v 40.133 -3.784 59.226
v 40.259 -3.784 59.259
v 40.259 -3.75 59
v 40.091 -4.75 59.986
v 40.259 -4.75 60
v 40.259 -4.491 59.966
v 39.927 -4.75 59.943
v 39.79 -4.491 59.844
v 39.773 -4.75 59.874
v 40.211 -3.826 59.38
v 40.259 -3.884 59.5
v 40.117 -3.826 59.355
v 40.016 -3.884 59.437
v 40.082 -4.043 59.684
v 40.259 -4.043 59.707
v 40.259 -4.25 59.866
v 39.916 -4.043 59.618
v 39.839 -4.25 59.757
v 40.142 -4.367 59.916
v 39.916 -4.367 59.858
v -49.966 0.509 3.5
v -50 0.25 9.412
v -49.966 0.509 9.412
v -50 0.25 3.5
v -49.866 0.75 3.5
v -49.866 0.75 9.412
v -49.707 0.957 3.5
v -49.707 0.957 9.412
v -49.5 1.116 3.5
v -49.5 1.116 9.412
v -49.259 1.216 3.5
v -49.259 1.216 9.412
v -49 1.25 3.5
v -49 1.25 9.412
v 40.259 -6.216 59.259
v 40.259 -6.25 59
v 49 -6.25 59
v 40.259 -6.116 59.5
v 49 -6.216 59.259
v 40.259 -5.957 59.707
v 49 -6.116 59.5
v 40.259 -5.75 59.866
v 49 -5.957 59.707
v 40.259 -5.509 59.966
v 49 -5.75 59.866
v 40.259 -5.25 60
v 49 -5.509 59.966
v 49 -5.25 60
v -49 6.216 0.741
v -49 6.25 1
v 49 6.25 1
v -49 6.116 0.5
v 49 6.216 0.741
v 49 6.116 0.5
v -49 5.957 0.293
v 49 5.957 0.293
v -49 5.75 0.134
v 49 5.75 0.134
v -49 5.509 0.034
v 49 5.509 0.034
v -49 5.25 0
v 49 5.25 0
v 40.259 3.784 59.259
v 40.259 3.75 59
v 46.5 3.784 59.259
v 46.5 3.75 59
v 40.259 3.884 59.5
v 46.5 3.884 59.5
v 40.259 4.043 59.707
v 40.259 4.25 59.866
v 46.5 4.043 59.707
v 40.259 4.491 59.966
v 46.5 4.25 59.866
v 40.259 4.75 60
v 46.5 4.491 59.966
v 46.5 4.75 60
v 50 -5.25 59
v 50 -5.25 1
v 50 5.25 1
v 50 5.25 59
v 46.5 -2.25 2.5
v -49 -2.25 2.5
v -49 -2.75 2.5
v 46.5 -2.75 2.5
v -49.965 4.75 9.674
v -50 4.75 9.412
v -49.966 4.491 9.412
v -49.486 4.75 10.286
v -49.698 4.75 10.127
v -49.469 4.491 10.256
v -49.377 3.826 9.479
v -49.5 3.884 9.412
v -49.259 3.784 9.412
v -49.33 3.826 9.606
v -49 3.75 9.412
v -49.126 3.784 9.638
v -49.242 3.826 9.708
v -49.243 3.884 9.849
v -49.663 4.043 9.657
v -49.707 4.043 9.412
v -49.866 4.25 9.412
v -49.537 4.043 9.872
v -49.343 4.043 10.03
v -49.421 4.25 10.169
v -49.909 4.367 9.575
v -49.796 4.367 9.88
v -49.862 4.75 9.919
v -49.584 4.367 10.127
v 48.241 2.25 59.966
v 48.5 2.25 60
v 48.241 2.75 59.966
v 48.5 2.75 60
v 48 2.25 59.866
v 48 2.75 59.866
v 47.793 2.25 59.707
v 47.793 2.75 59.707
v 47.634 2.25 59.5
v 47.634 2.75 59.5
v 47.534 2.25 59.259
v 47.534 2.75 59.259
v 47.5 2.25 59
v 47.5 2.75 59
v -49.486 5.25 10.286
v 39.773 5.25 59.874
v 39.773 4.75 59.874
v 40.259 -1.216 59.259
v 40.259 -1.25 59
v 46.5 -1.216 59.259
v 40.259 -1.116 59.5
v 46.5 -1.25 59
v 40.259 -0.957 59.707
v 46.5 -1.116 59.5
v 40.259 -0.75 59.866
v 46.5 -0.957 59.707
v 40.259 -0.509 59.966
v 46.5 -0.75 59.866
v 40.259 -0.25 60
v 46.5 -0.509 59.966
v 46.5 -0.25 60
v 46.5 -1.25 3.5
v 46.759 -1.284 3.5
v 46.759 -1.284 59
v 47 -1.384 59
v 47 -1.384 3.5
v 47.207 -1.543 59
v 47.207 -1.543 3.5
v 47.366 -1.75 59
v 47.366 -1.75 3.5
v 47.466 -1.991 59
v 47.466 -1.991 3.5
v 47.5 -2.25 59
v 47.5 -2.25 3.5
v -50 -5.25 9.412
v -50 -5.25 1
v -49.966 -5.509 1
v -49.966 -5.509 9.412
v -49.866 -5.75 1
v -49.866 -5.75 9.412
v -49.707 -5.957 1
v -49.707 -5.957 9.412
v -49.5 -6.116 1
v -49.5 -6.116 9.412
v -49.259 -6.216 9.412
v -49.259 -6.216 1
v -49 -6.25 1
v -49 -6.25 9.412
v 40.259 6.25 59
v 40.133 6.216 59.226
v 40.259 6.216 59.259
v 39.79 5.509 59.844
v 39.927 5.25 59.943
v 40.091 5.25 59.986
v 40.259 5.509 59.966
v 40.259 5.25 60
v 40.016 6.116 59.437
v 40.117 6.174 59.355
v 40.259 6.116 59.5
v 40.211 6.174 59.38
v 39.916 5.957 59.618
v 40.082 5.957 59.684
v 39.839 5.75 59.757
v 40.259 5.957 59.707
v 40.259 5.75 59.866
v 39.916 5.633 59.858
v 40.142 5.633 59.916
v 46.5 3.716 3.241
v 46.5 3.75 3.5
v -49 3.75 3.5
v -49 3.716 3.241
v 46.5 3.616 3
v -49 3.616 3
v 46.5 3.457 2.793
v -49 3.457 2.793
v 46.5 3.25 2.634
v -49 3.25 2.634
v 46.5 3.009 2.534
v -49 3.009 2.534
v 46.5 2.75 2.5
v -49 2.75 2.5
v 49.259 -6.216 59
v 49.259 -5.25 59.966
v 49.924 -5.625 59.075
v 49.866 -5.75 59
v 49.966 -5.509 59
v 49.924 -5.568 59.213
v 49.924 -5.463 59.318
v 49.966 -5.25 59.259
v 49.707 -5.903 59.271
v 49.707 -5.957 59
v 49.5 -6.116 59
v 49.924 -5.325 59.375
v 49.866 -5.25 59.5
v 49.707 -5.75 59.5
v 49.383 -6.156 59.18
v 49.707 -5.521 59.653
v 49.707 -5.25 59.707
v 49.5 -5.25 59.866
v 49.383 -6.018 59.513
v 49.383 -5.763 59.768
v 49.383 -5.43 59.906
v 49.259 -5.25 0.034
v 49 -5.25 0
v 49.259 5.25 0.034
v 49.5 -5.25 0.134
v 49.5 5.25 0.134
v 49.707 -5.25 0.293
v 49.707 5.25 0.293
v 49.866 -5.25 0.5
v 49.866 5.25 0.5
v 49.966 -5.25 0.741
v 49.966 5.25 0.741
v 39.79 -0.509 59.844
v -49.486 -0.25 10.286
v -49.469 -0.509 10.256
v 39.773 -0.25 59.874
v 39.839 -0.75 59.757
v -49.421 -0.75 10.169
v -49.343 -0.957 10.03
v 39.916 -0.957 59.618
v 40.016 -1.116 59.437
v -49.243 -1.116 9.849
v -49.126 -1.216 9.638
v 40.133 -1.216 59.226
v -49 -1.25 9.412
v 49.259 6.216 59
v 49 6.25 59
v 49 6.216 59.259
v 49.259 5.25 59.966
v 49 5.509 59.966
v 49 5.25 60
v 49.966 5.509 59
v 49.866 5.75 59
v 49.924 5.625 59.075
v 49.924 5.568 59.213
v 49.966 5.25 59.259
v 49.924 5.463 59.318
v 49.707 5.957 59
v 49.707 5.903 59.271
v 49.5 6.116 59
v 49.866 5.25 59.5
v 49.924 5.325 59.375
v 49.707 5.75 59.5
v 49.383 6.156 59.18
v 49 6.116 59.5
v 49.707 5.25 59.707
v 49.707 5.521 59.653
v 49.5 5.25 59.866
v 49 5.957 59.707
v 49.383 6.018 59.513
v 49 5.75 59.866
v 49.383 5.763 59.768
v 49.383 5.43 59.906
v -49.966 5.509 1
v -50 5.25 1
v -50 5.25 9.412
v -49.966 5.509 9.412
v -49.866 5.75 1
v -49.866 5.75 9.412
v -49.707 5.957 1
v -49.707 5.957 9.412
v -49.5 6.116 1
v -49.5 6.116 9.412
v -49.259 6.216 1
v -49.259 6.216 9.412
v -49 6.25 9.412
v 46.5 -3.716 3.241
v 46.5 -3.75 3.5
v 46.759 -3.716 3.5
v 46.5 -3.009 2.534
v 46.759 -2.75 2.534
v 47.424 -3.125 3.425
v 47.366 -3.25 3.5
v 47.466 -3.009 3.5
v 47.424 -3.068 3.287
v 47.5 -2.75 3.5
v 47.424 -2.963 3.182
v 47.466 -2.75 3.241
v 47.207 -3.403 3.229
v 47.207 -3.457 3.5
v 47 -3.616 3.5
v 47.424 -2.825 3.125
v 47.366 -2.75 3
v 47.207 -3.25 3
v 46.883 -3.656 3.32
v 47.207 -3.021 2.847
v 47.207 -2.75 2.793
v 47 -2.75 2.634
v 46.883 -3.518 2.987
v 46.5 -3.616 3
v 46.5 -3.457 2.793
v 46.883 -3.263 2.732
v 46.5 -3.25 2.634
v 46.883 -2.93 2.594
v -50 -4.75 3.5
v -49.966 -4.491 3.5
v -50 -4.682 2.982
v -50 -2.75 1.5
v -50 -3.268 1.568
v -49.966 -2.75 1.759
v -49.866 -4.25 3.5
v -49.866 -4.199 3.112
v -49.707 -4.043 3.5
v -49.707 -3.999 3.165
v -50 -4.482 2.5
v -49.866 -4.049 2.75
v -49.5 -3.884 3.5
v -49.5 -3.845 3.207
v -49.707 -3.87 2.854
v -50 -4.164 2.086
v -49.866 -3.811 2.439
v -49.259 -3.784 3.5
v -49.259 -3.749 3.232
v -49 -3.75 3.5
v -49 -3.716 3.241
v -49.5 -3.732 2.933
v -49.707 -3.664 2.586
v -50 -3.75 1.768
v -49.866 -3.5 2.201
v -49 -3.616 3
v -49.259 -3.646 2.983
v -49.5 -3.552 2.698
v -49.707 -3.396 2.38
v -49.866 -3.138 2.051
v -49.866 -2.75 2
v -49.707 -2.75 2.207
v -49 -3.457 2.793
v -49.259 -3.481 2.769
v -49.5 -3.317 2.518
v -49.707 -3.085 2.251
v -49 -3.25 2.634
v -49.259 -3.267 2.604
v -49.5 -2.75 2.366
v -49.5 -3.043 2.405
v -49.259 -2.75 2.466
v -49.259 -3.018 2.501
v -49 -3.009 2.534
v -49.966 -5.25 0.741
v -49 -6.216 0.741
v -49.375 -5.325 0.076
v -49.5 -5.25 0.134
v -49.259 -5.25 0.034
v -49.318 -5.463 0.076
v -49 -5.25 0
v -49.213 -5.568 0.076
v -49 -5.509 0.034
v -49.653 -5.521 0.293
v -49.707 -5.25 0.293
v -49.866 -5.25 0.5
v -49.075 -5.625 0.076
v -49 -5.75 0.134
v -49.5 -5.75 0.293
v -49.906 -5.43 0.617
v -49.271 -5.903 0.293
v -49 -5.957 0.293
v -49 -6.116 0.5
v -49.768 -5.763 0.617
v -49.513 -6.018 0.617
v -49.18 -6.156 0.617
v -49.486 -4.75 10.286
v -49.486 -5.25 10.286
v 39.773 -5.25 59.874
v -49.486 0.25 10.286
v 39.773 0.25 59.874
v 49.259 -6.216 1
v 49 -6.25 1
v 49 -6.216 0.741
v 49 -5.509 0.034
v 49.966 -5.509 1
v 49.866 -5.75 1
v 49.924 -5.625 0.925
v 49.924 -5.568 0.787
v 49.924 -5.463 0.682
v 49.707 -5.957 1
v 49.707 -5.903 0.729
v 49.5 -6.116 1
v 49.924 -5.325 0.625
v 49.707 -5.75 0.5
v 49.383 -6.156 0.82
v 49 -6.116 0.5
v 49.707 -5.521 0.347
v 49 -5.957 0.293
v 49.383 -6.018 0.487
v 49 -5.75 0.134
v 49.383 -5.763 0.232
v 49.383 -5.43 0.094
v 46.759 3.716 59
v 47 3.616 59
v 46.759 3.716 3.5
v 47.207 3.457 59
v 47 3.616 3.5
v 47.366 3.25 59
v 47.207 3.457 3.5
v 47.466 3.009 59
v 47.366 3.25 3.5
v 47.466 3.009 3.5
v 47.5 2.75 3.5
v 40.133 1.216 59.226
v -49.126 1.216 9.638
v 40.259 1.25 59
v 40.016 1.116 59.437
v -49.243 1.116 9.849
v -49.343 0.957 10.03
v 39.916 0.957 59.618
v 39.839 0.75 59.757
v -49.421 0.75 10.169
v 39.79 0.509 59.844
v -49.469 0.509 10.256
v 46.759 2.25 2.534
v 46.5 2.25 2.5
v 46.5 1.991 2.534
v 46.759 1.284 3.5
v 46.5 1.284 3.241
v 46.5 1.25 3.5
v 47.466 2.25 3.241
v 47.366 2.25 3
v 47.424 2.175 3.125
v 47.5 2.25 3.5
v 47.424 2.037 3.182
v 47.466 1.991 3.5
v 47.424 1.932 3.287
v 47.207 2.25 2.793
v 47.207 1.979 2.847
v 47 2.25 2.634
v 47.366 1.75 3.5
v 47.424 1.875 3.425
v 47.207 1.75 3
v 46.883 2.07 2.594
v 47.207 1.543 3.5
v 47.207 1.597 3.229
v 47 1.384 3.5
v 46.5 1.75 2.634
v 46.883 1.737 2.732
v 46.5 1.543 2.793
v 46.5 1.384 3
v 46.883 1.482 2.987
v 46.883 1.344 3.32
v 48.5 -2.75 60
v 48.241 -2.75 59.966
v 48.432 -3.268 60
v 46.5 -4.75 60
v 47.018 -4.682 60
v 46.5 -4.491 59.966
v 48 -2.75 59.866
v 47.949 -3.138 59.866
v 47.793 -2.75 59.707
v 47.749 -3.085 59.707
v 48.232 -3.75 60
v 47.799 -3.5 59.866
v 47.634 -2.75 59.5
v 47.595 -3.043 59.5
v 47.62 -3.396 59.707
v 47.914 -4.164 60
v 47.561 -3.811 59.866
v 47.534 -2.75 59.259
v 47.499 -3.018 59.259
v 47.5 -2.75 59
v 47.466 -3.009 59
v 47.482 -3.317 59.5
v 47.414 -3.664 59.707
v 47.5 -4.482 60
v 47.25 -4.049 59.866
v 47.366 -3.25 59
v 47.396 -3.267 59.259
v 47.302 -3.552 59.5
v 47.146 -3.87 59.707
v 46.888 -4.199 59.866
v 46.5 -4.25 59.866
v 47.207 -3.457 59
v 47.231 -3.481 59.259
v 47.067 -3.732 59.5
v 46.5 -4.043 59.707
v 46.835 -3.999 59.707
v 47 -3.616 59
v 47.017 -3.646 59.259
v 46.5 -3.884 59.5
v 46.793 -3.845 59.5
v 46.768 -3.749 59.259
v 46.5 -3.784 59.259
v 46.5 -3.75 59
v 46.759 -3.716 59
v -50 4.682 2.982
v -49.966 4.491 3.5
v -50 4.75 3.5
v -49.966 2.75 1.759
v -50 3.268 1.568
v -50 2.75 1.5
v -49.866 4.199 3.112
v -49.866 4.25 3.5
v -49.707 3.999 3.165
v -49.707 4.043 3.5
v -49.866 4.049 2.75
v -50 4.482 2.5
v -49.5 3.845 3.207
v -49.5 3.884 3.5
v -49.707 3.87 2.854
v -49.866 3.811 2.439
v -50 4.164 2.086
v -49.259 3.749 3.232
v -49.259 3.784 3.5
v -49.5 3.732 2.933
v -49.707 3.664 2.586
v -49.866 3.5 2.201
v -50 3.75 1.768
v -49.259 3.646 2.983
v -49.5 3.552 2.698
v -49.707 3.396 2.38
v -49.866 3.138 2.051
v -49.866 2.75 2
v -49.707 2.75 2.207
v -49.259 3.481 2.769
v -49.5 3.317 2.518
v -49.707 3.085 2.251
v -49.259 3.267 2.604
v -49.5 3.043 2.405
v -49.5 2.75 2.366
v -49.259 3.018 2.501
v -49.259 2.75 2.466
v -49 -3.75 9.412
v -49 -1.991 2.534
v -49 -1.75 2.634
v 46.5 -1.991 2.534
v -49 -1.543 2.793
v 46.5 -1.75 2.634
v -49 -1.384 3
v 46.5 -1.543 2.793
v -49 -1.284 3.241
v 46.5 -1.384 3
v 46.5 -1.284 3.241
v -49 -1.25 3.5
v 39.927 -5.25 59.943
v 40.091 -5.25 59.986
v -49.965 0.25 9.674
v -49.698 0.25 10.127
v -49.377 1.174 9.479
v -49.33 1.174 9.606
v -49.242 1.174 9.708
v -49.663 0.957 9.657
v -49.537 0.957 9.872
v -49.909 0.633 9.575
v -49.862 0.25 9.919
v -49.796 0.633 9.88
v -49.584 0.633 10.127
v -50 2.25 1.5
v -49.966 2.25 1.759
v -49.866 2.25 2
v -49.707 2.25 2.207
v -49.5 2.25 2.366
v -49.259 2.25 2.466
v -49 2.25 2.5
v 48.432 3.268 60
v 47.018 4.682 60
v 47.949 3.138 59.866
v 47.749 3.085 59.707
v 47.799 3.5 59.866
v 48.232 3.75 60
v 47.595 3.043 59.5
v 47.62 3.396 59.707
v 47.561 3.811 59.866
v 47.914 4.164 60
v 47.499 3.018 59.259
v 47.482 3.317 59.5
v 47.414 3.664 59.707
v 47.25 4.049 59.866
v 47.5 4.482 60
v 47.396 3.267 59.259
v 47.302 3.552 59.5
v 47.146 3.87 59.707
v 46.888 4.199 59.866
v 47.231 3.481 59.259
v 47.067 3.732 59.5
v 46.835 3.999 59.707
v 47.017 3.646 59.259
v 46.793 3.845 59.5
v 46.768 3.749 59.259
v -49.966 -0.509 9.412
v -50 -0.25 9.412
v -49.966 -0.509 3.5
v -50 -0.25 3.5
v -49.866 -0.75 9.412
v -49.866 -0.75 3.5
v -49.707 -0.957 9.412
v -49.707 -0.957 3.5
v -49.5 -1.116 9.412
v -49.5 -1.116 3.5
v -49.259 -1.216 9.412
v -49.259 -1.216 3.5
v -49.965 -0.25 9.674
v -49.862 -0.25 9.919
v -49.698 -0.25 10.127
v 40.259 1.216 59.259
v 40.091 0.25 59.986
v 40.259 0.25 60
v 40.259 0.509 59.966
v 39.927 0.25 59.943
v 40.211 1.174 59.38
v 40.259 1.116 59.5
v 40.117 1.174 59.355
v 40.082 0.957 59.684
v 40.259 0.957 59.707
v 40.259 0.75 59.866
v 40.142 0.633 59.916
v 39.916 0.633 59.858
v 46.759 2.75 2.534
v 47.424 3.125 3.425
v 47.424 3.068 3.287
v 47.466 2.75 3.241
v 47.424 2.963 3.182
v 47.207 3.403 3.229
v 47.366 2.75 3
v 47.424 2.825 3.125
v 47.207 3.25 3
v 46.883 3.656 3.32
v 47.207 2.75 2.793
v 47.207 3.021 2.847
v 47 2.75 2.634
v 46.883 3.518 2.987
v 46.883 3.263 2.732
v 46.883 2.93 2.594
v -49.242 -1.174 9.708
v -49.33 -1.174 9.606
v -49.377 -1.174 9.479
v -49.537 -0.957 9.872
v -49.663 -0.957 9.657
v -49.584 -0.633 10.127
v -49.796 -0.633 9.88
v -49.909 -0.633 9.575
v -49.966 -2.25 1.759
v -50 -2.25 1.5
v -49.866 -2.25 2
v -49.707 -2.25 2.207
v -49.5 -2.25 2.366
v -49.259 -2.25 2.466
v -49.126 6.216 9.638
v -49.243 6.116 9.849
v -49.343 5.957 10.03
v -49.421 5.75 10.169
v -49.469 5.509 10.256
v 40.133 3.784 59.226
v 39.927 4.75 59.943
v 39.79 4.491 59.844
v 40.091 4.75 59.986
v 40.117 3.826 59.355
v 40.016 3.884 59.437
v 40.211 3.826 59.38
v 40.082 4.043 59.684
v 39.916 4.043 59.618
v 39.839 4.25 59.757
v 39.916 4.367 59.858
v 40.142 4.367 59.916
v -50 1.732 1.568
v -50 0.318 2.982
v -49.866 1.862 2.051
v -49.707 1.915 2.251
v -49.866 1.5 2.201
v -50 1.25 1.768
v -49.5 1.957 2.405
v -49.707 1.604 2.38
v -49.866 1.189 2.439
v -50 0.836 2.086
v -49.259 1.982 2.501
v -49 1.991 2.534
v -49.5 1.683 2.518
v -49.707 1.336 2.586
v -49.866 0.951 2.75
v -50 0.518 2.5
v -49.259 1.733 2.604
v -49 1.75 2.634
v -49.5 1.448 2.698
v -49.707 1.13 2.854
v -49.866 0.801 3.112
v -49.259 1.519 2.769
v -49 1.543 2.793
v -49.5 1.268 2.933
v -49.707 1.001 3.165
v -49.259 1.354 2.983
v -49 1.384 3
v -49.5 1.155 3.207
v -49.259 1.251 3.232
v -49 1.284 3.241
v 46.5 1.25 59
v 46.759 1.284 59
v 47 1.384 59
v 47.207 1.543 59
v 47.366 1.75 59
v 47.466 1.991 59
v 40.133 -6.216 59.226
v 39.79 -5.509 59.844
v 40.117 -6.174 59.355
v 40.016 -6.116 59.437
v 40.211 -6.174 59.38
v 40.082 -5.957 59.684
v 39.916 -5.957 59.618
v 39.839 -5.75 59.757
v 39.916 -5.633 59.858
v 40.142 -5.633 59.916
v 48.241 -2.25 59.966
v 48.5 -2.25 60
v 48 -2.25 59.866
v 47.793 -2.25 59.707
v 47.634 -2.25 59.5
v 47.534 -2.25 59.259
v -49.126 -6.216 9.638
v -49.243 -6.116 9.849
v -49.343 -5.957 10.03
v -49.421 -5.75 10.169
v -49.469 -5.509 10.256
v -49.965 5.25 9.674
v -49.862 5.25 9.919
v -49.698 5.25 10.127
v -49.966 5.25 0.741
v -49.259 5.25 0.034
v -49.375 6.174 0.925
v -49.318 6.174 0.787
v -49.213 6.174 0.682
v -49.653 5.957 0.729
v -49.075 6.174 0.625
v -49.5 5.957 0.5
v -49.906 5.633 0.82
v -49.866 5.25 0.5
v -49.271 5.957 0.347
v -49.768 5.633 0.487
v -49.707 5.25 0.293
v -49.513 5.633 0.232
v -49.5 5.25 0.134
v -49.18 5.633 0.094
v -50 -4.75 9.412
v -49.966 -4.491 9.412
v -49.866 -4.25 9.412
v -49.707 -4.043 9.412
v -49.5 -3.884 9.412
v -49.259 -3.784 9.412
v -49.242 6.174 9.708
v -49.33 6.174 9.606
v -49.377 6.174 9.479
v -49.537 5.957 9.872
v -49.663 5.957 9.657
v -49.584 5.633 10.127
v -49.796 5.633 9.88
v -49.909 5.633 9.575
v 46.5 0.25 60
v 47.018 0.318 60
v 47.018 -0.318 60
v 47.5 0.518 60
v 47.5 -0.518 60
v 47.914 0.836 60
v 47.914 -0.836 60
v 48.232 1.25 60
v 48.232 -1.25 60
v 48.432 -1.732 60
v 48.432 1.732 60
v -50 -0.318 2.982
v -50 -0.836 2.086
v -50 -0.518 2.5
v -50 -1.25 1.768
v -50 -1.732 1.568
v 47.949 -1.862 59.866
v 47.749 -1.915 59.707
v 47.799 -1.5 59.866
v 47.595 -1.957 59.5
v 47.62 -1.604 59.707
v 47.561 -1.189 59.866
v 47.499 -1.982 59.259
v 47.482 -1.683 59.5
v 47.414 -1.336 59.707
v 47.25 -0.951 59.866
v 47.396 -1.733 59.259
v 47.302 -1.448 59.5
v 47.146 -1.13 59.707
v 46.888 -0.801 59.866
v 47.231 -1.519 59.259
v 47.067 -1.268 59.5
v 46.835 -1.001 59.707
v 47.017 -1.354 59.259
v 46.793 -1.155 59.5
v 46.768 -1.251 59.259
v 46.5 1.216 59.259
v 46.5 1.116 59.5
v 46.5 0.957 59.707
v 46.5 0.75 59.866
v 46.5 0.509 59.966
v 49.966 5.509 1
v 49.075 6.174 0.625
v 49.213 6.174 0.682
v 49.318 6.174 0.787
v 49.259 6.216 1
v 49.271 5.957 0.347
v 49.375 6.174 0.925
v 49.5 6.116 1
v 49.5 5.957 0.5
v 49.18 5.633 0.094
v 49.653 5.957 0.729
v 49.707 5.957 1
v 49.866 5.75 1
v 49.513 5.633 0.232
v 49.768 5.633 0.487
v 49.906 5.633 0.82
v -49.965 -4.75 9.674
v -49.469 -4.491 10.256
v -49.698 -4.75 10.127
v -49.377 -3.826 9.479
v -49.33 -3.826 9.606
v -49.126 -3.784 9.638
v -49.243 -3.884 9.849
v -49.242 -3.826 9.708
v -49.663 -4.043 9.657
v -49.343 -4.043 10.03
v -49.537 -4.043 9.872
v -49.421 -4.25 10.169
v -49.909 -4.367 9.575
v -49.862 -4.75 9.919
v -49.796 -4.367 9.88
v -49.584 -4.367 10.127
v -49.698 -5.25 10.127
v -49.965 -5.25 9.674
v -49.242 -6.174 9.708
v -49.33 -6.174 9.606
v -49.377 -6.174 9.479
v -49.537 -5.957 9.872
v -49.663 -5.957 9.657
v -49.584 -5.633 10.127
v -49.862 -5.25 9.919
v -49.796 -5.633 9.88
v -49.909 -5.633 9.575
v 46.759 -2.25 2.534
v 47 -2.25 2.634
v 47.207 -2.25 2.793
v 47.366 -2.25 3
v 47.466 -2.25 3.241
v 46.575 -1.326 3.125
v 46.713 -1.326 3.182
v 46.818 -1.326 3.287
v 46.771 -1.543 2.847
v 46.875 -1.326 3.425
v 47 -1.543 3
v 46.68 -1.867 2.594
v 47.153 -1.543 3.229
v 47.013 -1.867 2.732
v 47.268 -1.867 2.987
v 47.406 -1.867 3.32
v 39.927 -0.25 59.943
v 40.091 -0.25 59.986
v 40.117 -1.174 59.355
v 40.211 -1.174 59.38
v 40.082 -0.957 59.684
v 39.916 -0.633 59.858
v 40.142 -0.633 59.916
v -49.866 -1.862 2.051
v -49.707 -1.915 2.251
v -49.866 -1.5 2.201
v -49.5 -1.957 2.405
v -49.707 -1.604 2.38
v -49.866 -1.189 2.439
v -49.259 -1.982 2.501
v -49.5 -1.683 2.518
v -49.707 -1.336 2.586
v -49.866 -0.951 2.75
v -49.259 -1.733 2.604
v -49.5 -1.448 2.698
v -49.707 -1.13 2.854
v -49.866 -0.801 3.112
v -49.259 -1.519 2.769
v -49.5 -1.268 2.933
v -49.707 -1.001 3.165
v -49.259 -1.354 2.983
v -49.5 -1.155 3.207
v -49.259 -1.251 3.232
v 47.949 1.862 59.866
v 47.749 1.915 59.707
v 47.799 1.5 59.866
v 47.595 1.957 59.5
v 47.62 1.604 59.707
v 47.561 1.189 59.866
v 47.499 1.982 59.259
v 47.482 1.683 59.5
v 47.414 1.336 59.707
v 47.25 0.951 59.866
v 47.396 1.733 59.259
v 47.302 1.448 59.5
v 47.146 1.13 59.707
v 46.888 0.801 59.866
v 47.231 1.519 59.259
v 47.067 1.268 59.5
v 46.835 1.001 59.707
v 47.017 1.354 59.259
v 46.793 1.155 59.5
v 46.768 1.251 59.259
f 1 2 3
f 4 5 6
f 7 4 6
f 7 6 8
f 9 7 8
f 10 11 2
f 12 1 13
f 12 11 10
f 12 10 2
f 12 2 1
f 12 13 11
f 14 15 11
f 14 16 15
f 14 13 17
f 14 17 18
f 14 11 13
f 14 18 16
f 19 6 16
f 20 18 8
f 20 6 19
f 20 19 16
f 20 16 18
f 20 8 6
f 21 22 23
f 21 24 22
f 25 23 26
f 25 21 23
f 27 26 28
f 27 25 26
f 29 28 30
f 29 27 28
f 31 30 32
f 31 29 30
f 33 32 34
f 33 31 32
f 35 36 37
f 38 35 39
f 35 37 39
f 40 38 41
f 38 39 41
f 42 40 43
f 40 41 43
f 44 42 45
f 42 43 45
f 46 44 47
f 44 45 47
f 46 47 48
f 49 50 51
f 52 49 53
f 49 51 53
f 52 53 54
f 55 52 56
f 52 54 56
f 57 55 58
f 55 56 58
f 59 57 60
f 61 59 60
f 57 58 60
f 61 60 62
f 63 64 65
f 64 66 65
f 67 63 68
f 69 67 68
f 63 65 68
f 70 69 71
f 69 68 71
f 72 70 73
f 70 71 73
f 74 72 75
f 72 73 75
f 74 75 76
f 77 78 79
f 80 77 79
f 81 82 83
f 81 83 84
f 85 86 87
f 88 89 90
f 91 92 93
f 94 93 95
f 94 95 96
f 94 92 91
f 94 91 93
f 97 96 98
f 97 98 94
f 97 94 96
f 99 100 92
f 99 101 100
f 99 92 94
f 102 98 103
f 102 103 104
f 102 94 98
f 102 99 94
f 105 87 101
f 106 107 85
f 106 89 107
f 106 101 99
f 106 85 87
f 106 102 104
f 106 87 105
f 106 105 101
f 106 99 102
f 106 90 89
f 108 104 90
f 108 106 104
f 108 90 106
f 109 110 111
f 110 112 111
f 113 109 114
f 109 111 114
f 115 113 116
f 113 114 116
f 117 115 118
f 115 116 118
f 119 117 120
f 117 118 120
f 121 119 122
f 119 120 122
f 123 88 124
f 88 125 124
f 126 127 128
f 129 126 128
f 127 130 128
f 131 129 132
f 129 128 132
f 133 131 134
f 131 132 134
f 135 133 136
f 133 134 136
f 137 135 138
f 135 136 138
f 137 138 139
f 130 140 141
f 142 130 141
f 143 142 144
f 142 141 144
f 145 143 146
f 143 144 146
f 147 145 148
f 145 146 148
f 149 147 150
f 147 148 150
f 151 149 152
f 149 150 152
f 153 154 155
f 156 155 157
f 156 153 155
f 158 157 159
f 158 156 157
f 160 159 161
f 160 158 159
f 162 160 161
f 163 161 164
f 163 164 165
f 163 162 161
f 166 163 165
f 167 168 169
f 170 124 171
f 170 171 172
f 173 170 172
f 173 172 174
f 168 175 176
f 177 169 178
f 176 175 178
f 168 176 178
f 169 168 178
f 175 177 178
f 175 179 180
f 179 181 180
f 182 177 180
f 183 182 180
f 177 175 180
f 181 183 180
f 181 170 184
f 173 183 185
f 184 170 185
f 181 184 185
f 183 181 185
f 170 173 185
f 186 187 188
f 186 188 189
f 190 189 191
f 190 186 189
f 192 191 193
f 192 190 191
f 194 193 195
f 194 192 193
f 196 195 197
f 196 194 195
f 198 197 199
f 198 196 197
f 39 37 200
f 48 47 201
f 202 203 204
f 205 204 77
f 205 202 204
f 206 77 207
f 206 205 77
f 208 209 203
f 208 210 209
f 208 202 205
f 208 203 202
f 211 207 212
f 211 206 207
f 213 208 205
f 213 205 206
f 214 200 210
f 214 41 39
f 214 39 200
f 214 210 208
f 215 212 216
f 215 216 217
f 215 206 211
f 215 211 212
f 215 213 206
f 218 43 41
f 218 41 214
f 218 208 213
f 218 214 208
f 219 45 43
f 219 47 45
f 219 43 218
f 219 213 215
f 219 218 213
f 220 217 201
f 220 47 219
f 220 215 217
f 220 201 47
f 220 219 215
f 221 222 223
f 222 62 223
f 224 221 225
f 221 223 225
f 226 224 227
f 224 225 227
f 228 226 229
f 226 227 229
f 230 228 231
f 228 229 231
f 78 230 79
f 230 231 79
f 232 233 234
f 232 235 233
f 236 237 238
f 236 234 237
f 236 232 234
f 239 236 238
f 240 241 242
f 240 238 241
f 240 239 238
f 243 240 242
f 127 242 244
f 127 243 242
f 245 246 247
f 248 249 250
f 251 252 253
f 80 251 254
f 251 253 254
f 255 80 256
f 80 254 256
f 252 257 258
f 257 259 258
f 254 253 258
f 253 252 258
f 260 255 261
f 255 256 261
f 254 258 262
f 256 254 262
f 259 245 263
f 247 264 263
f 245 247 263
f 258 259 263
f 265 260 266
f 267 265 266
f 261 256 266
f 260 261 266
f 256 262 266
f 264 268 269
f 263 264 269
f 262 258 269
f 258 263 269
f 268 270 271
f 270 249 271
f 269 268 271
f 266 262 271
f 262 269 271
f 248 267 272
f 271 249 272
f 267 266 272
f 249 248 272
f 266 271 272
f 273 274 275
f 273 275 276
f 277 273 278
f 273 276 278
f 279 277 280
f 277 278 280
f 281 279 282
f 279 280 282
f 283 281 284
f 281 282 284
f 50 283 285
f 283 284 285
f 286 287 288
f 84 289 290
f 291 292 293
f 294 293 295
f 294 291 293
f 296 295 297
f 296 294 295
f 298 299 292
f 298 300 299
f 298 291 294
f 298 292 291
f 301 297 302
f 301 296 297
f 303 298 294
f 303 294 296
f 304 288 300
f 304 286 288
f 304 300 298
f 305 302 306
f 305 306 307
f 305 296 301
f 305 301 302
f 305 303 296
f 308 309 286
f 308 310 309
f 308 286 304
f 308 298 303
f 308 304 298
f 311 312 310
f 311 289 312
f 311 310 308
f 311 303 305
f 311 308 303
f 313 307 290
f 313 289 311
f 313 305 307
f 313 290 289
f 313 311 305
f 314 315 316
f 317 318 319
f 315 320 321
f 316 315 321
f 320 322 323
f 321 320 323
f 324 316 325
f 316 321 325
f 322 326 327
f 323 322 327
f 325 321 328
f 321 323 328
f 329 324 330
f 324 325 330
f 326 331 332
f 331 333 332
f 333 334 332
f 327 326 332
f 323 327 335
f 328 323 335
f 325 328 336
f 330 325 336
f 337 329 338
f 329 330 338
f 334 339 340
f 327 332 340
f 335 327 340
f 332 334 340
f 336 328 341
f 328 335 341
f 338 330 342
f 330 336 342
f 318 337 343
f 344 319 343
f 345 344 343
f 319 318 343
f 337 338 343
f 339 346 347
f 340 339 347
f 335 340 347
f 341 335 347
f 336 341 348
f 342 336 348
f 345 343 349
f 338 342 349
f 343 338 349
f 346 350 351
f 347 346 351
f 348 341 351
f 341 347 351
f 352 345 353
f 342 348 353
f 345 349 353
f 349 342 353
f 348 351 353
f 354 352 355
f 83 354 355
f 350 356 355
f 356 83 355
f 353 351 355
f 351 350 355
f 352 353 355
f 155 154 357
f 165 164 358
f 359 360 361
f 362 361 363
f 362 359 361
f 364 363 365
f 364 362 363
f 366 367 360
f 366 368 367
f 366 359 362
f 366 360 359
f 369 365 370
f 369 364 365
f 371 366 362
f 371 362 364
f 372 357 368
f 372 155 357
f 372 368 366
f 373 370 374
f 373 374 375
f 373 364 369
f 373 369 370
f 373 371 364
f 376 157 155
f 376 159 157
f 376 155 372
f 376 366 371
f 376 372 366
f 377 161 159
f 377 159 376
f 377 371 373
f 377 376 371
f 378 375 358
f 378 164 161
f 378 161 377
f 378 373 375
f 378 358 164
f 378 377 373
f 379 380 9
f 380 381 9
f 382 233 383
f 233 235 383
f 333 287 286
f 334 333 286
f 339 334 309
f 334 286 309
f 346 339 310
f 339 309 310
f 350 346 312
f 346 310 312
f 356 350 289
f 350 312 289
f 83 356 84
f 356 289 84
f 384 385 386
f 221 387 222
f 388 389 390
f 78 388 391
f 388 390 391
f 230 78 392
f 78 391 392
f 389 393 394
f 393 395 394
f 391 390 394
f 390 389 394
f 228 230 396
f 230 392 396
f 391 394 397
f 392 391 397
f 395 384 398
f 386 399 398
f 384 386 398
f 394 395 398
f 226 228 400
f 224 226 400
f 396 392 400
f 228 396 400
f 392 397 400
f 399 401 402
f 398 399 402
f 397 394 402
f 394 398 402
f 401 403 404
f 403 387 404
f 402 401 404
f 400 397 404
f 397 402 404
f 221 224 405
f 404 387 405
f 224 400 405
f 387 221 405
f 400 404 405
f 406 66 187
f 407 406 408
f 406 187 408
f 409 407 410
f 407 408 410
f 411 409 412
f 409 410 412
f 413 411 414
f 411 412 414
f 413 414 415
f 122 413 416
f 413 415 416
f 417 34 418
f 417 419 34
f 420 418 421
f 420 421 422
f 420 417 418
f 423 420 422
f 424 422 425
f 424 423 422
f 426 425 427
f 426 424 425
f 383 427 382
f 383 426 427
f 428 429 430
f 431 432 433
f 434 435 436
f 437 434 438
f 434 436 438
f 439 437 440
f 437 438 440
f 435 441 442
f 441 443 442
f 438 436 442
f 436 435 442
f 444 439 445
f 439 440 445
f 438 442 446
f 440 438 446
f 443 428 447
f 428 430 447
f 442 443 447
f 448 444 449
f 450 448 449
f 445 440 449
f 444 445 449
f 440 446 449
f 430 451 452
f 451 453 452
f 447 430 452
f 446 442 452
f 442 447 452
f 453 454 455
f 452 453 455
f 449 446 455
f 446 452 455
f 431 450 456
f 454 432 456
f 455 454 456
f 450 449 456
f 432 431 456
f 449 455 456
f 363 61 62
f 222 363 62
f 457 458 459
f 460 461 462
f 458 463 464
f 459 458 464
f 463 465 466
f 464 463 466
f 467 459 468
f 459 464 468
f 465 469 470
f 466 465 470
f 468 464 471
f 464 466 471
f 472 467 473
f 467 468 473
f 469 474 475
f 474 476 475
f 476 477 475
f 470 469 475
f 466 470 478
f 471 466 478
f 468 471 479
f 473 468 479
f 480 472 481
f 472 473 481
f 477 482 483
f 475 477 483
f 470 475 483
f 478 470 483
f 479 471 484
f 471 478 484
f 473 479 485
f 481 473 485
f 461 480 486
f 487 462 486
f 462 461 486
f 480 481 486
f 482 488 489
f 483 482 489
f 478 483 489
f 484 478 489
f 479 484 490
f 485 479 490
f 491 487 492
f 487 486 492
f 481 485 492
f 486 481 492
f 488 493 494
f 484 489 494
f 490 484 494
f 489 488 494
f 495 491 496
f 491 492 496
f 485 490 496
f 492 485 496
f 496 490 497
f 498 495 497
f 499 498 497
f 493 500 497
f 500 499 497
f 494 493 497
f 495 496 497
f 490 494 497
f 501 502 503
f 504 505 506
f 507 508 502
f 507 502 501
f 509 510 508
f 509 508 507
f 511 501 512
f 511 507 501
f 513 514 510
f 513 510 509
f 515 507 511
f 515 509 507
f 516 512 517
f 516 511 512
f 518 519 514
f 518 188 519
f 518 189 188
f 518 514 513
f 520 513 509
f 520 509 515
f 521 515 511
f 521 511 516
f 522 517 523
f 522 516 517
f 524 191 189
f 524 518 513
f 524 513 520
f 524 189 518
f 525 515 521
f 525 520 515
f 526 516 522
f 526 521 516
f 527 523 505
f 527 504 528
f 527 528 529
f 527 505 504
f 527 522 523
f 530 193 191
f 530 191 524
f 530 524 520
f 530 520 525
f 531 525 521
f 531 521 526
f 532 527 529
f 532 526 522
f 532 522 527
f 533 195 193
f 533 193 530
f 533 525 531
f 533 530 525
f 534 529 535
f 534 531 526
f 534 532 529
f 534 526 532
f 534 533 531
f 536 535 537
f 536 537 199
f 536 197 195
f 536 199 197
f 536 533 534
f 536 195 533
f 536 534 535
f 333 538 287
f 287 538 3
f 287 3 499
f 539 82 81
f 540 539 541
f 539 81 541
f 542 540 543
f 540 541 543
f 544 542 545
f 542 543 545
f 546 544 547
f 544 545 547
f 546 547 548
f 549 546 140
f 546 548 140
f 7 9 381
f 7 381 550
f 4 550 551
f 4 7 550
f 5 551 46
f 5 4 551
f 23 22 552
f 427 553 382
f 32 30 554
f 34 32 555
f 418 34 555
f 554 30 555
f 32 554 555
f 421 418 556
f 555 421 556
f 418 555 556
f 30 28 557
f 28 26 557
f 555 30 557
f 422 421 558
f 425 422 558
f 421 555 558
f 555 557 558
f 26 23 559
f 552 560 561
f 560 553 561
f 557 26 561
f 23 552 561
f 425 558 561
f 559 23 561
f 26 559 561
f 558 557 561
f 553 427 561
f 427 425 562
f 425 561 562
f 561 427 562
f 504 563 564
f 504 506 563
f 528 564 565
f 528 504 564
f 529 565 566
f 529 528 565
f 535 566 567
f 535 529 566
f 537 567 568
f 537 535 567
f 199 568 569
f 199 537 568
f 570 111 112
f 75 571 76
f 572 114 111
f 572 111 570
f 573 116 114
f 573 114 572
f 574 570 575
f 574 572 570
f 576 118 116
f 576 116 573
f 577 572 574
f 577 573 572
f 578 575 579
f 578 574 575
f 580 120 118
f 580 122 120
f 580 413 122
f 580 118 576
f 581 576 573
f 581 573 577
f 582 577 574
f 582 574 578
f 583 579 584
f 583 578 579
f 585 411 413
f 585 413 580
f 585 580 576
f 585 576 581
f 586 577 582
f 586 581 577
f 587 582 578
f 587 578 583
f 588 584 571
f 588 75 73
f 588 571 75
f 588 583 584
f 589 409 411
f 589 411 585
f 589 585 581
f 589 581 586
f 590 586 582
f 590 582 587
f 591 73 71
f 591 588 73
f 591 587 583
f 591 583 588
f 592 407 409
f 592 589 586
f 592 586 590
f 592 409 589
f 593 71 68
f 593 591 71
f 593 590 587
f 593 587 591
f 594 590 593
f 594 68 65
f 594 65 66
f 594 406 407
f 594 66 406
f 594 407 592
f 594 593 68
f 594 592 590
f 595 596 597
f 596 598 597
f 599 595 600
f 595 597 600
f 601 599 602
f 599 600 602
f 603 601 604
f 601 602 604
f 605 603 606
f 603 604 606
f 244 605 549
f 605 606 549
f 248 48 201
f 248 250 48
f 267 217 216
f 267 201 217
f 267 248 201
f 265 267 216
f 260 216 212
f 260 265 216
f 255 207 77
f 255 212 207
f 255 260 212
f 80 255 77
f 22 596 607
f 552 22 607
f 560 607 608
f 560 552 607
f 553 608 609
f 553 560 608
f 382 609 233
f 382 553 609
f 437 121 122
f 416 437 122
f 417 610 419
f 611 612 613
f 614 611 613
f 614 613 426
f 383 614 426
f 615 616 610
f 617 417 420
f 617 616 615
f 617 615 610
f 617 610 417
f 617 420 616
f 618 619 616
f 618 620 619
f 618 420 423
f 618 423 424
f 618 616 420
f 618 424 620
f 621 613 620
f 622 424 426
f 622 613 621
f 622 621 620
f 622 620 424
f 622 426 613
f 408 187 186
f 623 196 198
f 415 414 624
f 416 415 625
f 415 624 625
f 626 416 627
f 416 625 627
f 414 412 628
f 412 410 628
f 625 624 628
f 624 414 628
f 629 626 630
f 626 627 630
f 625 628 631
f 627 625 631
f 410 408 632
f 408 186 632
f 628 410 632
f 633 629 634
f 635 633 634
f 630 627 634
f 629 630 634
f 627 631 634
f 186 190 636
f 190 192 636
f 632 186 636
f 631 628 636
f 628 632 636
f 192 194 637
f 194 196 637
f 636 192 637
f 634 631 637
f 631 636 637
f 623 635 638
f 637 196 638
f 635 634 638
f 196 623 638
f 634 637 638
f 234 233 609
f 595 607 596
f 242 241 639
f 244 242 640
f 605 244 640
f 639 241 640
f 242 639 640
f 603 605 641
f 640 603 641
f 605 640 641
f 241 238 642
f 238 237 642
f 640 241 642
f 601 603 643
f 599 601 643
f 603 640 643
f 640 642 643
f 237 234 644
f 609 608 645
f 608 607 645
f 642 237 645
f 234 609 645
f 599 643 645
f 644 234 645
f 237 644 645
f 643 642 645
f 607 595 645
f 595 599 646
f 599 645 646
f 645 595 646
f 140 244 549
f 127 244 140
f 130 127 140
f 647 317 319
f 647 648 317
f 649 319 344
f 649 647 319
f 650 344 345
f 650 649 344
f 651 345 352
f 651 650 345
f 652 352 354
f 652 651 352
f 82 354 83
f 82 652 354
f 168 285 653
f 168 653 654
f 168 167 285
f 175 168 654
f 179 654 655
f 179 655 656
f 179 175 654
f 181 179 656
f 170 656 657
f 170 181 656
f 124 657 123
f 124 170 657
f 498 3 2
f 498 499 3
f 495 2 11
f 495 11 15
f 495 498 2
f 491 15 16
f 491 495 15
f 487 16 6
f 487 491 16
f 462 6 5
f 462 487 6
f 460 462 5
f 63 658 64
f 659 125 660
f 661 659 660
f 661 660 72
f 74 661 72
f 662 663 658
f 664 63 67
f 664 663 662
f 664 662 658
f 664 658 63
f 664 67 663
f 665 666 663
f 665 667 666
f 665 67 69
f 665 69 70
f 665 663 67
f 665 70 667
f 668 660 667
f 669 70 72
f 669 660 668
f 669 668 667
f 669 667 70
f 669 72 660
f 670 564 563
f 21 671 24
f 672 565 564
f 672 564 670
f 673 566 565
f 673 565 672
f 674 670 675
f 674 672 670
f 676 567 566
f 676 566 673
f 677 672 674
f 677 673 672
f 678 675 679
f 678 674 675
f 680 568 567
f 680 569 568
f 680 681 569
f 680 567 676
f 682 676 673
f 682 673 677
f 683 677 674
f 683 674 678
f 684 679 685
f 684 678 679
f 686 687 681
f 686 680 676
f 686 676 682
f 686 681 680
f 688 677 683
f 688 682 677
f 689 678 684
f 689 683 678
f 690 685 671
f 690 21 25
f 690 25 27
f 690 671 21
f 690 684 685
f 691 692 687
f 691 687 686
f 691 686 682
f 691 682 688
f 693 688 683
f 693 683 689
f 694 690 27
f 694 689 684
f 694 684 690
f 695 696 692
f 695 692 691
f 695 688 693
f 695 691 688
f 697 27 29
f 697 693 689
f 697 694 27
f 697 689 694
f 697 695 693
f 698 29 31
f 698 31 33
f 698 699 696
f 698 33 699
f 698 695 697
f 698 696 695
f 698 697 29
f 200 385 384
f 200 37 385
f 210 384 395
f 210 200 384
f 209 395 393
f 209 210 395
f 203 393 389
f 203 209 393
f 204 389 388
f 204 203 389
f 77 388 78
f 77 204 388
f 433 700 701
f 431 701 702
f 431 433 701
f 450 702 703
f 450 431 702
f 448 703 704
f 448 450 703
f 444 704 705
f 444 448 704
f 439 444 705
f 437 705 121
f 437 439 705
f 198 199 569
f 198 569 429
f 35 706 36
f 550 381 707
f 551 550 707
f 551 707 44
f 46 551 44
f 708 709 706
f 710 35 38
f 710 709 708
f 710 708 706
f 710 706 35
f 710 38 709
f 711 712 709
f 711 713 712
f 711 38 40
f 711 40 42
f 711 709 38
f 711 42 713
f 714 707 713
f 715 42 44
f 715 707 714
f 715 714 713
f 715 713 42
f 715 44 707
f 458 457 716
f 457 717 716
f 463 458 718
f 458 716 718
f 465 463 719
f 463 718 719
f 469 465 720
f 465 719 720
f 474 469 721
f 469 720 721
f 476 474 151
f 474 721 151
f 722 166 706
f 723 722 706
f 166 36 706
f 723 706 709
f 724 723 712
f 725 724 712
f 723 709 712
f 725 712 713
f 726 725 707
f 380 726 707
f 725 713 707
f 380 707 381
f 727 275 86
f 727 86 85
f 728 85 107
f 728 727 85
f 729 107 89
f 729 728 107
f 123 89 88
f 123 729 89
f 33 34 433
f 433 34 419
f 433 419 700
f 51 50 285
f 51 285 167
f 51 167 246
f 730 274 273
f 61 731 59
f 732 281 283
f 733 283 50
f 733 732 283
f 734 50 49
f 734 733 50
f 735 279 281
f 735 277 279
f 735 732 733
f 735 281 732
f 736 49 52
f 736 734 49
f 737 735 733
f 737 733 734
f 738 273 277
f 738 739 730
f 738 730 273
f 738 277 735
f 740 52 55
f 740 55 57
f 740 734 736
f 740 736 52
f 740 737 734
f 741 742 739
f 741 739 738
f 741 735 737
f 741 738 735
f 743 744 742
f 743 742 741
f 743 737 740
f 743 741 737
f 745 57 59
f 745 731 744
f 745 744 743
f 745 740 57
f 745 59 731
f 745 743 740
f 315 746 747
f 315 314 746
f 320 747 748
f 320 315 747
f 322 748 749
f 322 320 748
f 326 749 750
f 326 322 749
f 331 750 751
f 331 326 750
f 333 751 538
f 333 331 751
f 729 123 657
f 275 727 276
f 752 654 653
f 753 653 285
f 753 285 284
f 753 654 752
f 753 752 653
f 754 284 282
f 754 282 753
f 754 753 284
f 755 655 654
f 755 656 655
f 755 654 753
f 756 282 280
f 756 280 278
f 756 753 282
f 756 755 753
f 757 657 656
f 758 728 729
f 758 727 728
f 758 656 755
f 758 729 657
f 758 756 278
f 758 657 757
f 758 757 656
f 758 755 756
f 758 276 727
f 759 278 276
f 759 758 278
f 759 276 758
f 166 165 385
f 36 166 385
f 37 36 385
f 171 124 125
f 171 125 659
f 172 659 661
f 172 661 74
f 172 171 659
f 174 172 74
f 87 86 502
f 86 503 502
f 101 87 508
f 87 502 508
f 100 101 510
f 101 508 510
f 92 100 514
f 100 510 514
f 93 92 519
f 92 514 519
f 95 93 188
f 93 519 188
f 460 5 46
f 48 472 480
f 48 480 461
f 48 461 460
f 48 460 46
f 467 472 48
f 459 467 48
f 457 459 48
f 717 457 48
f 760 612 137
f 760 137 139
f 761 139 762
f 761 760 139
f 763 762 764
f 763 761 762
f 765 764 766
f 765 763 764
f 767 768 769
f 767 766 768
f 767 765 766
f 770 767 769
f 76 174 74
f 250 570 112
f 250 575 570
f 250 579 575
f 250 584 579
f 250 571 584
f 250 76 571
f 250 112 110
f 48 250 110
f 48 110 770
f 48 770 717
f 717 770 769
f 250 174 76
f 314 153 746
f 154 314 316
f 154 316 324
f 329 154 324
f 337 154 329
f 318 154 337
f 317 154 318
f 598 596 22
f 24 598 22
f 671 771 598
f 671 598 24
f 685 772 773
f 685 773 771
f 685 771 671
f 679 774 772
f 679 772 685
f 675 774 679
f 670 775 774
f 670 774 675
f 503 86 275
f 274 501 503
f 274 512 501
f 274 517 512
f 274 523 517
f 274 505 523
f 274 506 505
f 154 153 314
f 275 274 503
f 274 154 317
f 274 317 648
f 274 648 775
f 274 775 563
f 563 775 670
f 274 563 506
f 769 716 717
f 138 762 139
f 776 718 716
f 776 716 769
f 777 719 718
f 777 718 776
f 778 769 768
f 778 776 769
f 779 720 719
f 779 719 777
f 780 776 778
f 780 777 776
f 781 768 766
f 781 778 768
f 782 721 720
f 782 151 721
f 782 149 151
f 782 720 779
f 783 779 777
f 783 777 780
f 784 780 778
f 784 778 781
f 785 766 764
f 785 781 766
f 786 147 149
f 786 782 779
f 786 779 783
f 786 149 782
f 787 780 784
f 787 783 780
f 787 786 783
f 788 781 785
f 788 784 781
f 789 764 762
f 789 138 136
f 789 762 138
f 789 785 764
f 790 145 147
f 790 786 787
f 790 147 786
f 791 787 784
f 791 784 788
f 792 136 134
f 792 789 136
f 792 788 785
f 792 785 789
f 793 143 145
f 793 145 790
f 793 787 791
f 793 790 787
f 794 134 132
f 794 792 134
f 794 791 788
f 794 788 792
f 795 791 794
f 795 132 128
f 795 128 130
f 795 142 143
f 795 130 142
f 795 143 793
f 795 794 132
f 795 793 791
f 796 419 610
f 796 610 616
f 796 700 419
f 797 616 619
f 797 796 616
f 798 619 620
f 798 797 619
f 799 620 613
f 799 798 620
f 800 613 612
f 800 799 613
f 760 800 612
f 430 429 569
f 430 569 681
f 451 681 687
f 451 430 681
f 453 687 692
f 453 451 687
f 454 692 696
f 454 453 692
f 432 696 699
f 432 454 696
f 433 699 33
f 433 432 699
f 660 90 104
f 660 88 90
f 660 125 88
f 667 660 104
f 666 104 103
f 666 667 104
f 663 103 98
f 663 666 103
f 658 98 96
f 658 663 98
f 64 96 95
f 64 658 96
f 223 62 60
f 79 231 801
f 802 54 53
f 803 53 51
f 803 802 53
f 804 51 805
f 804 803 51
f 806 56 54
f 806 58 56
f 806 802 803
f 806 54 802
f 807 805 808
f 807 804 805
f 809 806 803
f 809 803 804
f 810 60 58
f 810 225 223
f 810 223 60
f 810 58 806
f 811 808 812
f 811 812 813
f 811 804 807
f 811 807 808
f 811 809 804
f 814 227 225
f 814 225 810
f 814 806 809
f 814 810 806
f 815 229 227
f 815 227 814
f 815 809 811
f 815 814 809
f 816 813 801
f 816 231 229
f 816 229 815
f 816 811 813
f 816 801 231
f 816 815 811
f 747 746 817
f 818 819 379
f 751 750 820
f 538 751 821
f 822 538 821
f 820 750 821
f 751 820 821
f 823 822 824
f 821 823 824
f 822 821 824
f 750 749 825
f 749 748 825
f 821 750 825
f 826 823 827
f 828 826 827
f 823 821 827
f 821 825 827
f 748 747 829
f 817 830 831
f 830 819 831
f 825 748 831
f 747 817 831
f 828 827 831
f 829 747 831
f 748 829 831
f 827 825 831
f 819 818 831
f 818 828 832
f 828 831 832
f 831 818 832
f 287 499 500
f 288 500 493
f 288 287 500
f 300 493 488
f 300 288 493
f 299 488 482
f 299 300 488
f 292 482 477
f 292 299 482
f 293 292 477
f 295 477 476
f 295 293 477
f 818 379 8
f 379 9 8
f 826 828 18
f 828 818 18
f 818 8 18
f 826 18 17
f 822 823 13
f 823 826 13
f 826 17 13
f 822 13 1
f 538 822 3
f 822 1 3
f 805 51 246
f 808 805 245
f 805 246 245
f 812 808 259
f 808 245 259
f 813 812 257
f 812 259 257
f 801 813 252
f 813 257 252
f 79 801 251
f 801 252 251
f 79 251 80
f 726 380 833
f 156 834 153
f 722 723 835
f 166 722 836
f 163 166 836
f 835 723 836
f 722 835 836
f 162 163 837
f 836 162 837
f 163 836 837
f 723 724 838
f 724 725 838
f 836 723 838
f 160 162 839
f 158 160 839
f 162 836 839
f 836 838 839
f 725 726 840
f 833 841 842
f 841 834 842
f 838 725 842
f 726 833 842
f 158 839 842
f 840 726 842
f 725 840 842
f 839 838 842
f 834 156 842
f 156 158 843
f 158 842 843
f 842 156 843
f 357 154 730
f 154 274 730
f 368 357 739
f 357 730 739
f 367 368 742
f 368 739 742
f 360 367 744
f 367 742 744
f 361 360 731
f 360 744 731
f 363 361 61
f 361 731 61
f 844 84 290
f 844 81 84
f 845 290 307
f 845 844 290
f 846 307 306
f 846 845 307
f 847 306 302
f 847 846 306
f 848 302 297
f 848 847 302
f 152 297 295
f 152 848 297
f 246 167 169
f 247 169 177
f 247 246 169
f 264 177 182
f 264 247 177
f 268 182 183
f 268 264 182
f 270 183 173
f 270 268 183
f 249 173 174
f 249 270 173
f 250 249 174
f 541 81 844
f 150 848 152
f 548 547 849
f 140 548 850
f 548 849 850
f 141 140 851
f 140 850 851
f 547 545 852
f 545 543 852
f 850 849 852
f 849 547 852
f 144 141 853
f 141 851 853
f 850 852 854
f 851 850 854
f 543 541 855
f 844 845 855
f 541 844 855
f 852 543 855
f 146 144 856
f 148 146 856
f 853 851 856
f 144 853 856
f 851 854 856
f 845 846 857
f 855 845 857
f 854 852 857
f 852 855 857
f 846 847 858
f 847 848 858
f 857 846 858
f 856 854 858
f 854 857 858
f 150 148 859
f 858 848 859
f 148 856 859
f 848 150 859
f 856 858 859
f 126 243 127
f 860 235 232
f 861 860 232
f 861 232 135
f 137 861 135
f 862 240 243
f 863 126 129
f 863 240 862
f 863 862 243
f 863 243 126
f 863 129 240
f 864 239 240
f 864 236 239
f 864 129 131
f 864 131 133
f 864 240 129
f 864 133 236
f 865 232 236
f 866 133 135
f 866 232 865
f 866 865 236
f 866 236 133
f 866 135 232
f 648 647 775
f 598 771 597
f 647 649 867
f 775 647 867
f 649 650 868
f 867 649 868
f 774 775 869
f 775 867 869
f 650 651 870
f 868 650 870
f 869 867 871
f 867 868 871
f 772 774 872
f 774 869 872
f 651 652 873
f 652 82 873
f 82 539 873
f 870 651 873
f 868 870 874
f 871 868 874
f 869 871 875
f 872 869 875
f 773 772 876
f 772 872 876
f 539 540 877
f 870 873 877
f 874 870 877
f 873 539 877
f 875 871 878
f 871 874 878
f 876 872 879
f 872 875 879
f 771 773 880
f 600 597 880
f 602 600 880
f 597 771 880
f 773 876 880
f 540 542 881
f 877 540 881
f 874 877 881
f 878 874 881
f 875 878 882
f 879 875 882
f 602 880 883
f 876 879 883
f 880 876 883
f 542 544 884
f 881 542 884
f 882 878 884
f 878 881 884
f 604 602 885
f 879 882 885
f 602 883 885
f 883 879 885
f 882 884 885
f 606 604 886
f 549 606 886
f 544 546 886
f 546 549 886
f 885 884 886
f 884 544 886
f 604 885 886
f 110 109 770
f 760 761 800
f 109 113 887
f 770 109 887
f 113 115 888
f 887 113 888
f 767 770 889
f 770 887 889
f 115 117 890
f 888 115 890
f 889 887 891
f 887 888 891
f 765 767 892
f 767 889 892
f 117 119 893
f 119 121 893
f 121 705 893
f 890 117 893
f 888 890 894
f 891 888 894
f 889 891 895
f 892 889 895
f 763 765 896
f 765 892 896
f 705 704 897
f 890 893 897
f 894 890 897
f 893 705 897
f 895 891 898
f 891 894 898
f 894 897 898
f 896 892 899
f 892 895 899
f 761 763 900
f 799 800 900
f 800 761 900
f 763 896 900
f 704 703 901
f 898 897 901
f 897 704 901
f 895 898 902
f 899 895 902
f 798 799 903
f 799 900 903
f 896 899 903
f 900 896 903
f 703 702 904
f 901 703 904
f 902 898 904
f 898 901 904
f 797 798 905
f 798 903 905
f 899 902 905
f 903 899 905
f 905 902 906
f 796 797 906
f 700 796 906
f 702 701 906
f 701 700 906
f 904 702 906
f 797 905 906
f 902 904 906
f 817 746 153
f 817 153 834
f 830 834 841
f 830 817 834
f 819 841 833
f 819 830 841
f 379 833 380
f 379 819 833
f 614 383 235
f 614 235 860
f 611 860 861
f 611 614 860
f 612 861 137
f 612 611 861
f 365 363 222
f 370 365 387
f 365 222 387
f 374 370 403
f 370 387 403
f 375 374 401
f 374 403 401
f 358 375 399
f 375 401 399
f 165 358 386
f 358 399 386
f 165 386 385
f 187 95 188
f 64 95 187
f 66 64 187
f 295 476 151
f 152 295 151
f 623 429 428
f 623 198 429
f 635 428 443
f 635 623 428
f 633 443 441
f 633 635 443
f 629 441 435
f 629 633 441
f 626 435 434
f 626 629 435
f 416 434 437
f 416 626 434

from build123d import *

# Parameters (mm, degrees)
SKETCH_W      = 100
SKETCH_H      = 12.5
PAD_DEPTH     = 60
SKETCH001_W   = 97.5
SKETCH001_H   = 2.5
POCKET_DEPTH  = 57.5
CHAMFER_SIZE2 = 90
CHAMFER_SIZE  = 50
FILLET_R      = 1


with BuildPart() as part:
    # Sketch (on XY_Plane of Origin) → Pad (new body)
    with BuildSketch(Plane.XY):
        Rectangle(SKETCH_W, SKETCH_H)
    extrude(amount=PAD_DEPTH)

    # Sketch001 (on Face6 of Pad) → Pocket (cut)
    with BuildSketch(Plane.XY.offset(60)):
        with Locations((-1.25, 2.5)):
            Rectangle(SKETCH001_W, SKETCH001_H)
        with Locations((-1.25, -2.5)):
            Rectangle(SKETCH001_W, SKETCH001_H)
    extrude(amount=-POCKET_DEPTH, mode=Mode.SUBTRACT)

    # Chamfer
    chamfer_edges = [part.edges().sort_by_distance(p)[0] for p in [
        (-50, 5, 60),
        (-50, 0, 60),
        (-50, -5, 60),
    ]]
    chamfer_side = part.faces().sort_by_distance((-50, 0, 29.222973))[0]
    chamfer(chamfer_edges, length=CHAMFER_SIZE, length2=CHAMFER_SIZE2, reference=chamfer_side)

    # Fillet
    fillet_edges = [part.edges().sort_by_distance(p)[0] for p in [
        (-50, -6.25, 5),
        (-50, -5, 10),
        (-50, 0, 0),
        (-50, -3.75, 6.25),
        (-50, 6.25, 5),
        (-50, -2.5, 2.5),
        (-50, 5, 10),
        (-50, -1.25, 6.25),
        (-50, 3.75, 6.25),
        (-50, 0, 10),
        (-50, 2.5, 2.5),
        (-50, 1.25, 6.25),
        (-5, -6.25, 35),
        (0, -6.25, 0),
        (45, -6.25, 60),
        (50, -6.25, 30),
        (-5, -3.75, 35),
        (40, -5, 60),
        (50, 0, 0),
        (0, 6.25, 0),
        (-1.25, -3.75, 2.5),
        (43.75, -3.75, 60),
        (47.5, -3.75, 31.25),
        (-5, 6.25, 35),
        (45, 6.25, 60),
        (50, 6.25, 30),
        (47.5, -2.5, 2.5),
        (-1.25, -1.25, 2.5),
        (40, 5, 60),
        (-5, 3.75, 35),
        (-5, -1.25, 35),
        (43.75, -1.25, 60),
        (47.5, -1.25, 31.25),
        (-1.25, 3.75, 2.5),
        (43.75, 3.75, 60),
        (47.5, 3.75, 31.25),
        (-5, 1.25, 35),
        (40, 0, 60),
        (-1.25, 1.25, 2.5),
        (47.5, 2.5, 2.5),
        (43.75, 1.25, 60),
        (47.5, 1.25, 31.25),
        (50, 0, 60),
        (47.5, 2.5, 60),
        (47.5, -2.5, 60),
    ]]
    fillet(fillet_edges, radius=FILLET_R)


solid = part.part
